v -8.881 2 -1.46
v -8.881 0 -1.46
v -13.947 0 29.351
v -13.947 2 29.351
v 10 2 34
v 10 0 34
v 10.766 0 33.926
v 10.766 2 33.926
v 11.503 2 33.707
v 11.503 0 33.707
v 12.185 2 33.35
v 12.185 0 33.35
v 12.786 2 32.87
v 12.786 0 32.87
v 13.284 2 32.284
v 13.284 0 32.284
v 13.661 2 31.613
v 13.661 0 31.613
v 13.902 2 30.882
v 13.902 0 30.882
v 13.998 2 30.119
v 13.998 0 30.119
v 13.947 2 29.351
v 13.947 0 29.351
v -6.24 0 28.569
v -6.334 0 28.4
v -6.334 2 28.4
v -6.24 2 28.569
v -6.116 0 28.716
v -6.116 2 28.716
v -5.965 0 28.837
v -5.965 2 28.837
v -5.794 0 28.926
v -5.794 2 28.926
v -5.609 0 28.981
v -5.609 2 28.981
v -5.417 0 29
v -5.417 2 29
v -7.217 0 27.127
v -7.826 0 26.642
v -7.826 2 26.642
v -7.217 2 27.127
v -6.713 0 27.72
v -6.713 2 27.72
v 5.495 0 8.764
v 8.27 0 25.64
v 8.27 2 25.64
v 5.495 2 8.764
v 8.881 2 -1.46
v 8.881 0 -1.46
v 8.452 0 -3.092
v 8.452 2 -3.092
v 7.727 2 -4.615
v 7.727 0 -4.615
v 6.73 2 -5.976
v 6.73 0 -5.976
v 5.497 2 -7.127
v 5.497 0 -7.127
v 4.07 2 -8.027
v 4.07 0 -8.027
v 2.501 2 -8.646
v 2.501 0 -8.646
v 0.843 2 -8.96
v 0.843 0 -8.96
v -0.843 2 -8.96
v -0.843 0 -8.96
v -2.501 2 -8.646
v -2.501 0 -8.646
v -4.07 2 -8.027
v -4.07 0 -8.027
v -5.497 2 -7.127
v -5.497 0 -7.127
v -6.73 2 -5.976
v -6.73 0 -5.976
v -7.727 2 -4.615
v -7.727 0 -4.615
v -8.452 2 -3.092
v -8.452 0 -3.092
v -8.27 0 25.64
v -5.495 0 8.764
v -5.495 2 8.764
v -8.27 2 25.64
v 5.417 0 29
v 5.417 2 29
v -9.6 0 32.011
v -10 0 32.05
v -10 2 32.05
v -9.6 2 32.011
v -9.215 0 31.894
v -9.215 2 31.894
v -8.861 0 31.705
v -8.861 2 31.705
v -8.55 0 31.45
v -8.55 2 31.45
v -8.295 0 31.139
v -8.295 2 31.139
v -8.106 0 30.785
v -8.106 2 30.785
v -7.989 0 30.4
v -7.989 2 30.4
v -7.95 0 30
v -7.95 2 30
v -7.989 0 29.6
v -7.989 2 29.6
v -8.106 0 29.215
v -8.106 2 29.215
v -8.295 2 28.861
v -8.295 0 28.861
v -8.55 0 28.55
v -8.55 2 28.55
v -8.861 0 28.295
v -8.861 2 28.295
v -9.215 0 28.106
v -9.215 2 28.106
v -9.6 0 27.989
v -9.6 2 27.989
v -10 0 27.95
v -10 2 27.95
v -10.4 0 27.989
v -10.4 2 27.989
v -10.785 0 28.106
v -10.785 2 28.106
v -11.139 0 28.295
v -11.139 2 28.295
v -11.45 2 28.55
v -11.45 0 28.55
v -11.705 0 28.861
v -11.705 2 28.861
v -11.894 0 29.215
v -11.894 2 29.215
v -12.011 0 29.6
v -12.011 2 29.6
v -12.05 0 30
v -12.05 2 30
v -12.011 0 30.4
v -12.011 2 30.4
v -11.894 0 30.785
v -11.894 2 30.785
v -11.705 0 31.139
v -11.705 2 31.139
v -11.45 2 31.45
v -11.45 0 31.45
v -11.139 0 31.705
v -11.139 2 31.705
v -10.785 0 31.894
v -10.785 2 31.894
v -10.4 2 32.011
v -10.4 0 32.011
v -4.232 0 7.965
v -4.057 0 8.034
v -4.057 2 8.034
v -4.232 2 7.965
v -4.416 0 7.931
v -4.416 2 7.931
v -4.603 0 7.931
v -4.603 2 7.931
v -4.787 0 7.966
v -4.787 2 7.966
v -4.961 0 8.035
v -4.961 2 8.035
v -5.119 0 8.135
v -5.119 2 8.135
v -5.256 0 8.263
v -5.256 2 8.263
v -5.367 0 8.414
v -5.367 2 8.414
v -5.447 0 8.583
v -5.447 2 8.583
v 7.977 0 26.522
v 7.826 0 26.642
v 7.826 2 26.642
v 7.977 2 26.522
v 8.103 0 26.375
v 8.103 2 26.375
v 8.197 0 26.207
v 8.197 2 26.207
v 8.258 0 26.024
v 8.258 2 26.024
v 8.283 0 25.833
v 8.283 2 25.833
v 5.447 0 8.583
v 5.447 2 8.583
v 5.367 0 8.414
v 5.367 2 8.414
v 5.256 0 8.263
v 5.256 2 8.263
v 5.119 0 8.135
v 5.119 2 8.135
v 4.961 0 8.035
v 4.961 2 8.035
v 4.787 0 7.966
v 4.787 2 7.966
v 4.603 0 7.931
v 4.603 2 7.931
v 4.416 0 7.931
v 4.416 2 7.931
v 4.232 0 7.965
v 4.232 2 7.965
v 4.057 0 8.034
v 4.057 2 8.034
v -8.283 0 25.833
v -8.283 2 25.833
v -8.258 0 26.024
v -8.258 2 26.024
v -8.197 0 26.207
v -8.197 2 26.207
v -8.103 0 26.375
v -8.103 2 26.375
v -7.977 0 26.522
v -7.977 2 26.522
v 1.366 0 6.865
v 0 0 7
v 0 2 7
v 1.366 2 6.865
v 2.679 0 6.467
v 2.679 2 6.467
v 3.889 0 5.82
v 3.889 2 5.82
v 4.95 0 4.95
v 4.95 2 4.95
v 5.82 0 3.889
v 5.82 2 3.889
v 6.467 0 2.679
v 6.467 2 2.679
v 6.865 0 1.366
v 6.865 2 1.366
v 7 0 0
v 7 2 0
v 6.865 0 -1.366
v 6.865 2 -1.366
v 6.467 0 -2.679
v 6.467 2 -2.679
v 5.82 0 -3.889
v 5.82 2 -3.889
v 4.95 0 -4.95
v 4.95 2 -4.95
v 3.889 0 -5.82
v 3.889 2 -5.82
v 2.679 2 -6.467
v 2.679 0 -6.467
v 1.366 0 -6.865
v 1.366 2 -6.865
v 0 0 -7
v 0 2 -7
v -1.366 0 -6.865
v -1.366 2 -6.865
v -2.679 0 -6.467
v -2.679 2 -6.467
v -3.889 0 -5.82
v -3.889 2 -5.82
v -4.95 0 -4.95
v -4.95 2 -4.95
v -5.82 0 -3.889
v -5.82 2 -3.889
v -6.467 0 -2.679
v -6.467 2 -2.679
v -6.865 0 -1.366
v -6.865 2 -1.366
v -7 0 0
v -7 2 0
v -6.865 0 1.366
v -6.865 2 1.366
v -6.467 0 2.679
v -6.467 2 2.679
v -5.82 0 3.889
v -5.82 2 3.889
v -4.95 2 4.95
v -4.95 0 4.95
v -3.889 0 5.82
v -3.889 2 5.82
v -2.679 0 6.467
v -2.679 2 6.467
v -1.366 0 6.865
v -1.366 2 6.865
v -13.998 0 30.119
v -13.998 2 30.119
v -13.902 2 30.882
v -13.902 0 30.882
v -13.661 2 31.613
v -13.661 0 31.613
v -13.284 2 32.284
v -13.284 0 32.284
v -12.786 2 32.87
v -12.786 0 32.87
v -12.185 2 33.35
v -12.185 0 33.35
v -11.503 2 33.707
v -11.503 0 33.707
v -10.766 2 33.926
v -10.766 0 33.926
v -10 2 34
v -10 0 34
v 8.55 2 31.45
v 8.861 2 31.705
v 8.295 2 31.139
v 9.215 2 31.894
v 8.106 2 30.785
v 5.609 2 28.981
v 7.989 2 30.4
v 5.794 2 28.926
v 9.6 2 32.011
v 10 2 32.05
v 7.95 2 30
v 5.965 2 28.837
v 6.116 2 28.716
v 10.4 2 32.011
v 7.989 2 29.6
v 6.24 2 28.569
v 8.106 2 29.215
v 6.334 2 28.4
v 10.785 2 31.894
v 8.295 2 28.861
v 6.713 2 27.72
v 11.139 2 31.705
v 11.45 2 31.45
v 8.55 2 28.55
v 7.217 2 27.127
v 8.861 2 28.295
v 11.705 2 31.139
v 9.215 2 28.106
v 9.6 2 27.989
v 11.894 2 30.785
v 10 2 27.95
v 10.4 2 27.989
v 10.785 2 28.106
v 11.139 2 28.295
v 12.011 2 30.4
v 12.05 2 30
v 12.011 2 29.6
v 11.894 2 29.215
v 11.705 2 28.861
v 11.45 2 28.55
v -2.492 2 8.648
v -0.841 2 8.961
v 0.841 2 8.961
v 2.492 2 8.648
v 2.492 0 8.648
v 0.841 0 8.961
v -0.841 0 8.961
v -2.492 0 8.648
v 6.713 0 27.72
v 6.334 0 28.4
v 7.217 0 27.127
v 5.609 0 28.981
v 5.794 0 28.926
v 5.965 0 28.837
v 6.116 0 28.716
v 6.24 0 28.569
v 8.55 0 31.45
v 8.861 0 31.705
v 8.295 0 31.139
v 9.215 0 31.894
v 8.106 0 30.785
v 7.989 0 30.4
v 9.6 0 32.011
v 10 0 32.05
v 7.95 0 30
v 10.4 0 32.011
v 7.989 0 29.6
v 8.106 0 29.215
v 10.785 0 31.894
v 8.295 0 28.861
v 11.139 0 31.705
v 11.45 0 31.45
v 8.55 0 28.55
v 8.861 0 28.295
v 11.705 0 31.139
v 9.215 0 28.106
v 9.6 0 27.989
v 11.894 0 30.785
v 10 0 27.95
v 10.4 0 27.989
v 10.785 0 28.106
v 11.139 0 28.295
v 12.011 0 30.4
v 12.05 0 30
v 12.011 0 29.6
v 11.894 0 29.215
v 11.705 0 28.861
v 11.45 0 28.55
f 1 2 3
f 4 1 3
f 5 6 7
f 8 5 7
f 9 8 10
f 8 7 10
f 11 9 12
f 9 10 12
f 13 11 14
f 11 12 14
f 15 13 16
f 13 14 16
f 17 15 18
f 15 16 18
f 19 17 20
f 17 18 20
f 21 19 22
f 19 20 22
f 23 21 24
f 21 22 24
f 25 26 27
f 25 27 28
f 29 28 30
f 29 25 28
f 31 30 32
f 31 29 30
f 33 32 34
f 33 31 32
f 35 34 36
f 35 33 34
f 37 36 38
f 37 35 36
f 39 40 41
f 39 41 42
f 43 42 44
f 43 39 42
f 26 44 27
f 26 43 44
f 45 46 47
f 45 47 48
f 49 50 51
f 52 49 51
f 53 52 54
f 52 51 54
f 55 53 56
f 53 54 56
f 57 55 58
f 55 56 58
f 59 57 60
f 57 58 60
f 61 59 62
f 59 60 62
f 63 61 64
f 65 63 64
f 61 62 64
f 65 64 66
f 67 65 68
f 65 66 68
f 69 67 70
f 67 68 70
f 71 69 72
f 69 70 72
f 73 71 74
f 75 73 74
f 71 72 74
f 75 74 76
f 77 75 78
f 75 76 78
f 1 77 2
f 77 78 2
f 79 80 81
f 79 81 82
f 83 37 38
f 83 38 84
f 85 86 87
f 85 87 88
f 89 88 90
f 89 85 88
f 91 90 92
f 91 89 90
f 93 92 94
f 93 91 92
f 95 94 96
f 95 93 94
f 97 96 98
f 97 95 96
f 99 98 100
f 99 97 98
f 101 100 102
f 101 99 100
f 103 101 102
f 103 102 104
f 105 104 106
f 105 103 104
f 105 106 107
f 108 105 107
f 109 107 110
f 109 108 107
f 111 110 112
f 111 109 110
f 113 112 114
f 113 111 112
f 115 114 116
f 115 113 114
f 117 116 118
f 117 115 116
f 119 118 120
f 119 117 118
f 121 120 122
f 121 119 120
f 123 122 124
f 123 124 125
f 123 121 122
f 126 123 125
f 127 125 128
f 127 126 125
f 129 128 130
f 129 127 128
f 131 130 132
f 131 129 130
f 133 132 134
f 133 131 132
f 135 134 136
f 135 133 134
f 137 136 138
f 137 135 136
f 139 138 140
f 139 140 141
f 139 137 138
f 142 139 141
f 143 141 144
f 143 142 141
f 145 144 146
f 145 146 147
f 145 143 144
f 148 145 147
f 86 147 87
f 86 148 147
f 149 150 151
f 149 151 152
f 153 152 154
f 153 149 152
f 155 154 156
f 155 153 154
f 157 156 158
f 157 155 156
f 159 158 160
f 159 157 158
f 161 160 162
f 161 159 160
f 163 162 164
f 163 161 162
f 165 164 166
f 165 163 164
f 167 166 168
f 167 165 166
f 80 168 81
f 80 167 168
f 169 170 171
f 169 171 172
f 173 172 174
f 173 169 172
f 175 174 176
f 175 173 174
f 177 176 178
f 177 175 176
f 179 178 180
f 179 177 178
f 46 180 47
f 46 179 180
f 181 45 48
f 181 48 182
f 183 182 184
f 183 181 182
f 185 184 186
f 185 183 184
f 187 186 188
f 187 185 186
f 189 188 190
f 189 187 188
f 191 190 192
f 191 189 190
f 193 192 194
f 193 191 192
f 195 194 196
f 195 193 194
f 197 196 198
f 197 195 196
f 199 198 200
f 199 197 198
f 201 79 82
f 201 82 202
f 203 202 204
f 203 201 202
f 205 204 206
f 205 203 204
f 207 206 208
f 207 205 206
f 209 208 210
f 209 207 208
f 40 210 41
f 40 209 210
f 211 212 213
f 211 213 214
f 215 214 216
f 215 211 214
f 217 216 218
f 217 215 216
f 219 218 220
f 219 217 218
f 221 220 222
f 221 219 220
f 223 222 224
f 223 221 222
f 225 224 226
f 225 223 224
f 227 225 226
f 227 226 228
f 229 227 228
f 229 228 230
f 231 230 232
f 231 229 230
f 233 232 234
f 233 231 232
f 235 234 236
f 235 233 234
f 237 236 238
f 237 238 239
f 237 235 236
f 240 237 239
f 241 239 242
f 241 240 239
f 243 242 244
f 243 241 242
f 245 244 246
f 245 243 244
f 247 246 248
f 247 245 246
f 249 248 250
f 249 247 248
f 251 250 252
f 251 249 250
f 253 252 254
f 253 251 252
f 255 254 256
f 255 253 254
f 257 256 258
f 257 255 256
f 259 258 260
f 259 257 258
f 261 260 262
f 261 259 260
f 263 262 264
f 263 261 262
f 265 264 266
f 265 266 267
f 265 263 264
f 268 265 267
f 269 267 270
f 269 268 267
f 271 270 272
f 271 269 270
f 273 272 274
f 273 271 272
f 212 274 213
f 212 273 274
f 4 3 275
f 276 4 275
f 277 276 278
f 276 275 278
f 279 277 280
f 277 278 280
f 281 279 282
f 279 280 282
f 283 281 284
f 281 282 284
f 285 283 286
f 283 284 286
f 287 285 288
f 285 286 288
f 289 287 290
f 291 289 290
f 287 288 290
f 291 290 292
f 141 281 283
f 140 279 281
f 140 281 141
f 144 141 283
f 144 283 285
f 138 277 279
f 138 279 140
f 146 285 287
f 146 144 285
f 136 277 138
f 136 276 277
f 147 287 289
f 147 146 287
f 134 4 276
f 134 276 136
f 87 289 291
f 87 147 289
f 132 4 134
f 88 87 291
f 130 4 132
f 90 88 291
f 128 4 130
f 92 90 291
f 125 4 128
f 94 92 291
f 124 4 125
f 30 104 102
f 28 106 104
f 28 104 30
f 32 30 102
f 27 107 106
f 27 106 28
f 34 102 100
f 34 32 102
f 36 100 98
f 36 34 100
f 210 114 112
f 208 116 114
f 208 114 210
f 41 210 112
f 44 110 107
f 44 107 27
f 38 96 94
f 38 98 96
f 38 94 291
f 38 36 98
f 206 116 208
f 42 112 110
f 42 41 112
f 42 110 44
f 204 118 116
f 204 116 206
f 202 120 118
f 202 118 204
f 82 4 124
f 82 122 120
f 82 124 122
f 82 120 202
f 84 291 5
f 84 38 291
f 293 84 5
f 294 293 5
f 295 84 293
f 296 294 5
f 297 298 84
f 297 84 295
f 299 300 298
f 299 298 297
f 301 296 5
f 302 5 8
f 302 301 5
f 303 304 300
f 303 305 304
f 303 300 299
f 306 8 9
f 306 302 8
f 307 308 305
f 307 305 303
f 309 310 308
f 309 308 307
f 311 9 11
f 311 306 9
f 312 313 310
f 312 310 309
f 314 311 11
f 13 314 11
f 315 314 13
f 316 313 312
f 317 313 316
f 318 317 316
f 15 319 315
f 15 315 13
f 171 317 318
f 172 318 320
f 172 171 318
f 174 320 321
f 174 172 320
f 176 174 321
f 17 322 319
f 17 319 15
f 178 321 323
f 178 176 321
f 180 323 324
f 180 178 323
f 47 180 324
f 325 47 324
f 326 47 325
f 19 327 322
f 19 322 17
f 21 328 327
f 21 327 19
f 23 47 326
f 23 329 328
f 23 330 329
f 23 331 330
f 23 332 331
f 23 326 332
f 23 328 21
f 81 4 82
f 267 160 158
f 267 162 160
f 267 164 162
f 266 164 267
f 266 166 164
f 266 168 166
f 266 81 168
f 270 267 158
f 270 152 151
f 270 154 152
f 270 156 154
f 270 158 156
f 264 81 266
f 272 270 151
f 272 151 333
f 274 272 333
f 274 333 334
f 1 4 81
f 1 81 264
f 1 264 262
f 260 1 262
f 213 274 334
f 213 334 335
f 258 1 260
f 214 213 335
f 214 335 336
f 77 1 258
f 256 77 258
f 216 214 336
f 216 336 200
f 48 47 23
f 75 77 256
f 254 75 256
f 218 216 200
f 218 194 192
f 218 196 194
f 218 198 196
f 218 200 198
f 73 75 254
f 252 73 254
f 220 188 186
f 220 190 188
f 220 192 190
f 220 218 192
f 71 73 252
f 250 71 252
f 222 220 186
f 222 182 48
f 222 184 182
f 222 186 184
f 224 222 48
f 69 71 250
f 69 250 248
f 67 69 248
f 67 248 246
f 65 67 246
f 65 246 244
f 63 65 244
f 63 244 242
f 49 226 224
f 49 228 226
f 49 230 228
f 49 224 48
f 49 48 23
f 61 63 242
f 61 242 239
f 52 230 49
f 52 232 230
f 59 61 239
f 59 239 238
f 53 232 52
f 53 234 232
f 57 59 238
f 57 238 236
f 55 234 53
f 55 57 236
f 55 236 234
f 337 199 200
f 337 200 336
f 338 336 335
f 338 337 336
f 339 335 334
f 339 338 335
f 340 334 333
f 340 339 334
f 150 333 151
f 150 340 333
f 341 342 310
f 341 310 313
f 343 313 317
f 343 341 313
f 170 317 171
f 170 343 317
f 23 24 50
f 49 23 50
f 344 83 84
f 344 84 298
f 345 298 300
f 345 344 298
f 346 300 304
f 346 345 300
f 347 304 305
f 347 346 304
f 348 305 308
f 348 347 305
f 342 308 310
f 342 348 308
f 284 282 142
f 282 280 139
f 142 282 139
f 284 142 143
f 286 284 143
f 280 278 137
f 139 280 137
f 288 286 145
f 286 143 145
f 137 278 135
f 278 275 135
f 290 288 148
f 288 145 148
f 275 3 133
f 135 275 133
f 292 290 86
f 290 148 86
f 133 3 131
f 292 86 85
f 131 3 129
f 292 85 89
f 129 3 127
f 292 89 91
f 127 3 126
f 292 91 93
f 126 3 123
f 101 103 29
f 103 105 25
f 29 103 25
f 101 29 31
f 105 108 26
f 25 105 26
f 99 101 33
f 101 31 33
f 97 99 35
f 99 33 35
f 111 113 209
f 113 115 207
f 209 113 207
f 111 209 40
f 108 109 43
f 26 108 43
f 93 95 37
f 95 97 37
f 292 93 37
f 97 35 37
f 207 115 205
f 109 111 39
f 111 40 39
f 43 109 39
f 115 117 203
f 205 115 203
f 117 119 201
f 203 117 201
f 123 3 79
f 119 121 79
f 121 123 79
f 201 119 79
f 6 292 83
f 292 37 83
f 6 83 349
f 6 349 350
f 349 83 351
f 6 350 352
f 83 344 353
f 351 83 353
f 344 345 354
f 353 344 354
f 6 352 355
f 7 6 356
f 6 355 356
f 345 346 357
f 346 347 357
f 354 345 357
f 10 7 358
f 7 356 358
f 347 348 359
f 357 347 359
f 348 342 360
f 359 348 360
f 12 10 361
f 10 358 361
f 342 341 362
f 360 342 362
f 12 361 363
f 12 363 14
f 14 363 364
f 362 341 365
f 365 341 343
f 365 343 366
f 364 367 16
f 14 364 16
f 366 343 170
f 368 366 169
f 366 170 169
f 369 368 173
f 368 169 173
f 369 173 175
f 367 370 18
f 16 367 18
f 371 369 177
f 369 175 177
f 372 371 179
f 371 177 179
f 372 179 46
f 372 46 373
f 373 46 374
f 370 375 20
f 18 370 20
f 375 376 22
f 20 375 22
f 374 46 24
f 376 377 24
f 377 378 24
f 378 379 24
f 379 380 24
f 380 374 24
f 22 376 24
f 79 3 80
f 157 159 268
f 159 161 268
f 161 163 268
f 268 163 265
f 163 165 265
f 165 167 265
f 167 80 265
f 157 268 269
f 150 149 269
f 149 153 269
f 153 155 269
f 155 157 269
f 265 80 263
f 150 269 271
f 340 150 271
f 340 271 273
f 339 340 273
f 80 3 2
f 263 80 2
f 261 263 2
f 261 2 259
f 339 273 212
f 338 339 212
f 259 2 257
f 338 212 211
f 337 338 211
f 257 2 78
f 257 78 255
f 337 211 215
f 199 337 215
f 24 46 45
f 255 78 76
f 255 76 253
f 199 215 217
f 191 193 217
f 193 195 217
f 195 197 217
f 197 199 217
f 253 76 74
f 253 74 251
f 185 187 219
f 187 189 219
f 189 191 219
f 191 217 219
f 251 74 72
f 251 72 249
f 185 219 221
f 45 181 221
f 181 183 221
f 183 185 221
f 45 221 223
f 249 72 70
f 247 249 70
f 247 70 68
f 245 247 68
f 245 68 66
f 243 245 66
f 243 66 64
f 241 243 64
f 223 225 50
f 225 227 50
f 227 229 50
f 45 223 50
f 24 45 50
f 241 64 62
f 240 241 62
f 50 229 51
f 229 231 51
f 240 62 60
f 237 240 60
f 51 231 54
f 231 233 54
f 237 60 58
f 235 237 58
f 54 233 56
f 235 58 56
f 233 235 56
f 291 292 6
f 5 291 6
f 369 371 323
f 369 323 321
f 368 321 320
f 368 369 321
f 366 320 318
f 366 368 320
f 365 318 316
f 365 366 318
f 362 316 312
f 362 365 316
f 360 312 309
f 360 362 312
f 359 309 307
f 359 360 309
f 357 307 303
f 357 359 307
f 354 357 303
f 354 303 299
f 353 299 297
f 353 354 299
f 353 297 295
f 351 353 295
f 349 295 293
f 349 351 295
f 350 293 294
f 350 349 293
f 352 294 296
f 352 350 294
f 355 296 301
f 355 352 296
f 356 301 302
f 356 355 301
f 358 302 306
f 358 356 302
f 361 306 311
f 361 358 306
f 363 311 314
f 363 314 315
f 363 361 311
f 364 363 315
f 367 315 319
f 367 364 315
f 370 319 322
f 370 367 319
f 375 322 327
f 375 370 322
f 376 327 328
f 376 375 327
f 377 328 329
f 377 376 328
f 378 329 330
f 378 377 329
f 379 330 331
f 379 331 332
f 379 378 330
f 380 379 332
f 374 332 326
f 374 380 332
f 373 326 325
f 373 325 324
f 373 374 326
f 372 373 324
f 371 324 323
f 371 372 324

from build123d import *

# Parameters (mm, degrees)
SKETCH1_R           = 7
SKETCH1_R_2         = 2.05
BOSS_EXTRUDE1_DEPTH = 2


with BuildPart() as part:
    # Sketch1 → Boss-Extrude1 (new body)
    with BuildSketch(Plane(origin=(0, 0, 0), x_dir=(1, 0, 0), z_dir=(0, 1, 0))):
        with BuildLine():
            Line((-8.880747298, 1.460249099), (-13.946998799, -29.3510004))
            ThreePointArc((-13.946998799, -29.3510004), (-13.049262075, -32.588822281), (-10, -34))
            Line((-10, -34), (10, -34))
            ThreePointArc((10, -34), (13.049262075, -32.588822281), (13.946998799, -29.3510004))
            Line((13.946998799, -29.3510004), (8.880747298, 1.460249099))
            ThreePointArc((8.880747298, 1.460249099), (0, 9), (-8.880747298, 1.460249099))
        make_face()
        with Locations(Location((0, 0, 0), (0, 0, 270))):
            Circle(SKETCH1_R, mode=Mode.SUBTRACT)
        with Locations(Location((-10, -30, 0), (0, 0, 270))):
            Circle(SKETCH1_R_2, mode=Mode.SUBTRACT)
        with Locations(Location((10, -30, 0), (0, 0, 90))):
            Circle(SKETCH1_R_2, mode=Mode.SUBTRACT)
        with BuildLine():
            Line((-5.494764199, -8.763992606), (-8.269727852, -25.640394709))
            ThreePointArc((-8.269727852, -25.640394709), (-8.197420113, -26.207361672), (-7.826382522, -26.642115687))
            ThreePointArc((-7.826382522, -26.642115687), (-6.950737925, -27.411177719), (-6.333939444, -28.4))
            ThreePointArc((-6.333939444, -28.4), (-5.965146863, -28.836660027), (-5.417424305, -29))
            Line((-5.417424305, -29), (5.417424305, -29))
            ThreePointArc((5.417424305, -29), (5.965146863, -28.836660027), (6.333939444, -28.4))
            ThreePointArc((6.333939444, -28.4), (6.950737925, -27.411177719), (7.826382522, -26.642115687))
            ThreePointArc((7.826382522, -26.642115687), (8.197420113, -26.207361672), (8.269727852, -25.640394709))
            Line((8.269727852, -25.640394709), (5.494764199, -8.763992606))
            ThreePointArc((5.494764199, -8.763992606), (4.960973443, -8.03471113), (4.057213049, -8.033618256))
            ThreePointArc((4.057213049, -8.033618256), (0, -9), (-4.057213049, -8.033618256))
            ThreePointArc((-4.057213049, -8.033618256), (-4.960973443, -8.03471113), (-5.494764199, -8.763992606))
        make_face(mode=Mode.SUBTRACT)
    extrude(amount=BOSS_EXTRUDE1_DEPTH)


solid = part.part
